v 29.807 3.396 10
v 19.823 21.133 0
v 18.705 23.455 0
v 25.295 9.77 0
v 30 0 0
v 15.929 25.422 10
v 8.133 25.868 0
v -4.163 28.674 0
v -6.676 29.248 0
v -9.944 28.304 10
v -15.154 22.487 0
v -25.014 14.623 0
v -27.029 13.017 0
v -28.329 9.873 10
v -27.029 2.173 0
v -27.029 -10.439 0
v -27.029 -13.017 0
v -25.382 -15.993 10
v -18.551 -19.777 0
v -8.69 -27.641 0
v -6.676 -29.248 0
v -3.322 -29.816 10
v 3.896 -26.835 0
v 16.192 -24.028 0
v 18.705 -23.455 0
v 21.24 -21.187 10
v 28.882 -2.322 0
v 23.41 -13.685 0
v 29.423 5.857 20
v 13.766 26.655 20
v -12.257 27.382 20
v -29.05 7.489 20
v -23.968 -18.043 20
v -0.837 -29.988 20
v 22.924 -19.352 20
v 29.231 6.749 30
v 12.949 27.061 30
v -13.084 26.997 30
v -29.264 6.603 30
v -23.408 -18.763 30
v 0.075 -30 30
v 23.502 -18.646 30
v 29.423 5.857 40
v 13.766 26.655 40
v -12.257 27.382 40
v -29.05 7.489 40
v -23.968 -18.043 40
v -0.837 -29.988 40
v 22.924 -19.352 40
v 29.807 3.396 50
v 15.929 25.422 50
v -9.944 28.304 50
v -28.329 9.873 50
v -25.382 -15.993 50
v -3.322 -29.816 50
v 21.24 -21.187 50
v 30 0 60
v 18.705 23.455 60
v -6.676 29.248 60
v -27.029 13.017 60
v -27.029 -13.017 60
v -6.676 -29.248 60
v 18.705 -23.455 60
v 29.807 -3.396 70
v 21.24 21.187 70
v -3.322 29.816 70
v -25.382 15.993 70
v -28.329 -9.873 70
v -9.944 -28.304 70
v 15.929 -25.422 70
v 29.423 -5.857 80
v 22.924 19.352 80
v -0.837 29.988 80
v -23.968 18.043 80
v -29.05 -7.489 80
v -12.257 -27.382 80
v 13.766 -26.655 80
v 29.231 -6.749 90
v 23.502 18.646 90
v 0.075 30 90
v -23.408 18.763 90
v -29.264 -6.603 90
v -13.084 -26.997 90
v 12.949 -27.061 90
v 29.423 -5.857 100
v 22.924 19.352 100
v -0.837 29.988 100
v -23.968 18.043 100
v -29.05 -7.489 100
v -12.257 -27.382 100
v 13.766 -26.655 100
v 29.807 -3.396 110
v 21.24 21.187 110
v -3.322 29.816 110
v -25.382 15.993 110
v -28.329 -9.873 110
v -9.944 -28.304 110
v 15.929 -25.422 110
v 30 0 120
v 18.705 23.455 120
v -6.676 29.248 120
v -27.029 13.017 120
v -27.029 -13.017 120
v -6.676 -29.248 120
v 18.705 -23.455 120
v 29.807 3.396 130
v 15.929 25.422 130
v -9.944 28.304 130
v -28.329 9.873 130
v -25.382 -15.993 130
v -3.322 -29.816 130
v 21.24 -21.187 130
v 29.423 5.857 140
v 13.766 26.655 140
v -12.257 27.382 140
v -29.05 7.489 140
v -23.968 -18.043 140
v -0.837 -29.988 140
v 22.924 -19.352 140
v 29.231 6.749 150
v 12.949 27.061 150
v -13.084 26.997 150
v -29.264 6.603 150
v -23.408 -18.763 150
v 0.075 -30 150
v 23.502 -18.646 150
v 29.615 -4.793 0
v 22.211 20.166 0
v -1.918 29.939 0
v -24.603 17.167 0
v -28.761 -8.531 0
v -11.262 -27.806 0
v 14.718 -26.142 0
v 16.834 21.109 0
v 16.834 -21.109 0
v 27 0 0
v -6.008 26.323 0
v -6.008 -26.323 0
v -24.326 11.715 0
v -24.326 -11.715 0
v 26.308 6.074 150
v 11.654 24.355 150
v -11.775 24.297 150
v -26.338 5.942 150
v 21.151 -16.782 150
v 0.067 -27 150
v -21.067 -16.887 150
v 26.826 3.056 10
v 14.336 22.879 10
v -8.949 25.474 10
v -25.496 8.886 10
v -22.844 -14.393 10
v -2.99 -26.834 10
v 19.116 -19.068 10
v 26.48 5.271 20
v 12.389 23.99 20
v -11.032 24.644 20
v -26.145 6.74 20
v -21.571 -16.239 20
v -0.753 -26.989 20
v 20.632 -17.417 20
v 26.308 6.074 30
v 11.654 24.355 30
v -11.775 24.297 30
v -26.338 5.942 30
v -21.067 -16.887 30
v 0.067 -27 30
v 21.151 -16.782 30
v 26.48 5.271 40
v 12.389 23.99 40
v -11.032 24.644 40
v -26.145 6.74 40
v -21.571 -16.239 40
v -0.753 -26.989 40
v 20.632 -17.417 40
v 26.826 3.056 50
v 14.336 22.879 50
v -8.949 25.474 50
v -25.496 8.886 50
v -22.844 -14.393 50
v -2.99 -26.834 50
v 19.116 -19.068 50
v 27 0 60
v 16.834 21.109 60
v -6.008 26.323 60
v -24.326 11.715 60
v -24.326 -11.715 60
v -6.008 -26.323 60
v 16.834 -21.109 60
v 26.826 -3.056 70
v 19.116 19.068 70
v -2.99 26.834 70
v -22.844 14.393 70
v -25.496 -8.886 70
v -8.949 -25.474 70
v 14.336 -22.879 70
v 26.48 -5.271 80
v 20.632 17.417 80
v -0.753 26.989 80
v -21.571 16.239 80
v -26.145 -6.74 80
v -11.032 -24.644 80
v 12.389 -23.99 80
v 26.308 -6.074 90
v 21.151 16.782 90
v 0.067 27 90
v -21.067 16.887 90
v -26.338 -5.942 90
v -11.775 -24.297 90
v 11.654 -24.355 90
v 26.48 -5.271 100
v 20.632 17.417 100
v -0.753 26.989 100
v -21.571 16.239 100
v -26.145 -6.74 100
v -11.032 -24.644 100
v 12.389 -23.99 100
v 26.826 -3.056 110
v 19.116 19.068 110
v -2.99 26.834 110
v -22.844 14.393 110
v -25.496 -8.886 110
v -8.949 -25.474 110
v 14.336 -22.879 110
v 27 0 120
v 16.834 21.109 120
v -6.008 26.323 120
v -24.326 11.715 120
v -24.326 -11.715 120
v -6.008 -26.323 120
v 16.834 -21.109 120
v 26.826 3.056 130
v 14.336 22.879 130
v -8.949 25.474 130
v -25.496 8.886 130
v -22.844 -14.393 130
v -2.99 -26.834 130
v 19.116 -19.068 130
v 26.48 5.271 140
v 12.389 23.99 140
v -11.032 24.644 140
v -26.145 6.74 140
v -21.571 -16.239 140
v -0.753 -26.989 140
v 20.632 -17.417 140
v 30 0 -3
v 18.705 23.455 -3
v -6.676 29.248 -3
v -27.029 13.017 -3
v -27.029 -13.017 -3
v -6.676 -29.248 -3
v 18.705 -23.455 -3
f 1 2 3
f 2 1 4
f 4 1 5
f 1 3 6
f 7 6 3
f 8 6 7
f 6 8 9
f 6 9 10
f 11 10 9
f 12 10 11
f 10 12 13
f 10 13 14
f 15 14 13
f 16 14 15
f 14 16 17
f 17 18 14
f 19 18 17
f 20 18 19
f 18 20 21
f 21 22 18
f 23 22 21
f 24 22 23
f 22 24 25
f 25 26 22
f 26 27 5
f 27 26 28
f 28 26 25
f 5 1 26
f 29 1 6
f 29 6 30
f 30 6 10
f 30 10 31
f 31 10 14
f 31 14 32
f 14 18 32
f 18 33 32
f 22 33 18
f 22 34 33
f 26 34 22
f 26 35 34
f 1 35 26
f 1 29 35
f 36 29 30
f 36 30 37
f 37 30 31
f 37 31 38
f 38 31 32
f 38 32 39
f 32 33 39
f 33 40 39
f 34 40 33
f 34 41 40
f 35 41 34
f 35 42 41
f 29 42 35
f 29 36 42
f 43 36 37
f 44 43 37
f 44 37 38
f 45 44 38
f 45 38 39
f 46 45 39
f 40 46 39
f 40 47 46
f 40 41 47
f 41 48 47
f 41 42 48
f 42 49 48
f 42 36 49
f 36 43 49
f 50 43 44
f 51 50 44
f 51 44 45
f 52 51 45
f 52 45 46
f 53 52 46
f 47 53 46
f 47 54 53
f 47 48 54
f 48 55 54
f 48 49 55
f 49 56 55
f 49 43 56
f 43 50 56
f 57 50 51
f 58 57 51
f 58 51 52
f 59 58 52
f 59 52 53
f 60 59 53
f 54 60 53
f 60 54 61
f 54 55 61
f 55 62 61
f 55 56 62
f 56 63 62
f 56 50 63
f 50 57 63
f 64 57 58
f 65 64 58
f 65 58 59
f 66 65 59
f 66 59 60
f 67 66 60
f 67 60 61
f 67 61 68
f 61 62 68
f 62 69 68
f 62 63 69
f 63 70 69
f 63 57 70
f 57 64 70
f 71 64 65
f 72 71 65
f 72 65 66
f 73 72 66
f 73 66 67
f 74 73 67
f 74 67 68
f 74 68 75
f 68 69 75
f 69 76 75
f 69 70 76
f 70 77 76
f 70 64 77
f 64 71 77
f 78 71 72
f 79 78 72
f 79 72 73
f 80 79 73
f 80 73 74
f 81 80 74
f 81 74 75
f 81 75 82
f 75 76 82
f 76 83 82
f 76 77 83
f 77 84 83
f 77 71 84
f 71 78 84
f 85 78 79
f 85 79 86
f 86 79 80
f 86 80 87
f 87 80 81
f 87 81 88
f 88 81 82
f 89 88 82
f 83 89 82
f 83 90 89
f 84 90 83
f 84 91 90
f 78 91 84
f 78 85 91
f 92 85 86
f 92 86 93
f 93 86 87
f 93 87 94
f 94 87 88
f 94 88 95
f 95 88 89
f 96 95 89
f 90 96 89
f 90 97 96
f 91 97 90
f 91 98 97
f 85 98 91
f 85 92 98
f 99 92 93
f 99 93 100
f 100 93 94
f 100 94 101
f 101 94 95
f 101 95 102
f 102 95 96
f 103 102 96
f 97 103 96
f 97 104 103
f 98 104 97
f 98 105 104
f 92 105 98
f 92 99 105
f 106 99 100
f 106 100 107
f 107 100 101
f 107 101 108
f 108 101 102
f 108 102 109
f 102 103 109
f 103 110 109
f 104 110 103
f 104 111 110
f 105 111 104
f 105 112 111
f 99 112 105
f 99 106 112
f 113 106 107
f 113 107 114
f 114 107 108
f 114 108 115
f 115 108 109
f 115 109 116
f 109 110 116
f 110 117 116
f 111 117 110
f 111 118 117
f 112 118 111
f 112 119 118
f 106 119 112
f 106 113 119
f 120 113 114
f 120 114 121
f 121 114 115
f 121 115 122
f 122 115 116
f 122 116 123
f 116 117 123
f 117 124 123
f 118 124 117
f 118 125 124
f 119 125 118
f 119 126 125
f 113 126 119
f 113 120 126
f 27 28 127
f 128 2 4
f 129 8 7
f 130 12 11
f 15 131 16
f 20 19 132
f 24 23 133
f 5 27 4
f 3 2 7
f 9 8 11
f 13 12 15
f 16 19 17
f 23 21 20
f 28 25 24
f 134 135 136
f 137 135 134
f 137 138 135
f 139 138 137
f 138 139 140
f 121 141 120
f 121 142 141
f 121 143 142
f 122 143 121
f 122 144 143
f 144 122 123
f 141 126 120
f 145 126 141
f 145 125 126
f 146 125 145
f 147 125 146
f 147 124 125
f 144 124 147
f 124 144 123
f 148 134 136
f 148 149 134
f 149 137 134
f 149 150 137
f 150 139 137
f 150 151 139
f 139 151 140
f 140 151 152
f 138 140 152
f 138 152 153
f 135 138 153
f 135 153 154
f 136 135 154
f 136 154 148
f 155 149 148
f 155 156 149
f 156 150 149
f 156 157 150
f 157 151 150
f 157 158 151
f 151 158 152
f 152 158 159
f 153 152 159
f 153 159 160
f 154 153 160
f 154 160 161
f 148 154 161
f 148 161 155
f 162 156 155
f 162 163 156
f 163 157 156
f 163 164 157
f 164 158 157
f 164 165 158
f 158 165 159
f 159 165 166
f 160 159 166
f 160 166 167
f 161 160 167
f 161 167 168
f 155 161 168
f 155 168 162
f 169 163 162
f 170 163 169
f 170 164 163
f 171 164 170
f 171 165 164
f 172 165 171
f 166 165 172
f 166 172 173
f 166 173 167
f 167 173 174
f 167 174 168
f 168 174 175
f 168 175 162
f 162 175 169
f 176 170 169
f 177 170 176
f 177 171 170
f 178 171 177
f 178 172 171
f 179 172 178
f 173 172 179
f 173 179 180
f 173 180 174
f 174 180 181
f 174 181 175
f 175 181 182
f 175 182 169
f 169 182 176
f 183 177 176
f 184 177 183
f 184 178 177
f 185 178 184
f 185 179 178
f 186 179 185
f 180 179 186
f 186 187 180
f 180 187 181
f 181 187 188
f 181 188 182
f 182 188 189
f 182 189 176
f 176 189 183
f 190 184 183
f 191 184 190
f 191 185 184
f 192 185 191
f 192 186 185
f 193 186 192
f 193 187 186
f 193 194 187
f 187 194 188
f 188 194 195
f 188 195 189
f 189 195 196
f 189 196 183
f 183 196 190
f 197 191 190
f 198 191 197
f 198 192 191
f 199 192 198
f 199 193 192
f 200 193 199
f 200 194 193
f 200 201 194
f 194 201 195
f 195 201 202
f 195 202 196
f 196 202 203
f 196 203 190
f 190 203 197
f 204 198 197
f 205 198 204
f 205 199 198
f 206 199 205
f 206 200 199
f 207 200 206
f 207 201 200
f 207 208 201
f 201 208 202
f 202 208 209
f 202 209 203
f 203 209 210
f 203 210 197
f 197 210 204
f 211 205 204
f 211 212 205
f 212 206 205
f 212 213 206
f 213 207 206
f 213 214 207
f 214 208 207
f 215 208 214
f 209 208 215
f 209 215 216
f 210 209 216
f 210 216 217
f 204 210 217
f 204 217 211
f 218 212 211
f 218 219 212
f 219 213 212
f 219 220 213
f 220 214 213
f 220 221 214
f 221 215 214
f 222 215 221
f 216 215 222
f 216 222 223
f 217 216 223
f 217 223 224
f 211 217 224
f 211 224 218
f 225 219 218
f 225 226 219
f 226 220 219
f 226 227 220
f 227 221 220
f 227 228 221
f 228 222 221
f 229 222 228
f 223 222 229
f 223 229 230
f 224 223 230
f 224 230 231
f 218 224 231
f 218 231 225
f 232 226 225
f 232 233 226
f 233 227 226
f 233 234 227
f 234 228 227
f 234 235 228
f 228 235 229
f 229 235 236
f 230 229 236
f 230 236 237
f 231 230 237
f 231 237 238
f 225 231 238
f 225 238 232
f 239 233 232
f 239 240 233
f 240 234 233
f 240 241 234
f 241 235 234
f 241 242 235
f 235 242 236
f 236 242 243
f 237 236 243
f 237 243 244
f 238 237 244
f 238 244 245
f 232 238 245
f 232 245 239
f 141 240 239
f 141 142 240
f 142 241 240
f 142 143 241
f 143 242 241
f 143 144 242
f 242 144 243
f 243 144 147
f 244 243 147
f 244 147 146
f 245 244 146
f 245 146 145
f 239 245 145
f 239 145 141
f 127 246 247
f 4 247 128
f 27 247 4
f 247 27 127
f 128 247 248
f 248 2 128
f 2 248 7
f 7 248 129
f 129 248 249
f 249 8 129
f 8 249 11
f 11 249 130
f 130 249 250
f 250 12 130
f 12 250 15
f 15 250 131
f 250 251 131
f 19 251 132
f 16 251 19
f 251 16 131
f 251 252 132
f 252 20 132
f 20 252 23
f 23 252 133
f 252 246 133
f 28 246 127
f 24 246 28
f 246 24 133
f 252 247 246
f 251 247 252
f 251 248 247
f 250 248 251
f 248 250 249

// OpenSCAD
//number of sides
sides = 7;
//spacing of Z levels
z_spacing = 10;
//maximum radius, center to outer vertex
m_radius = 30;
//thickness (at thickest part)
thickness = 3;
// number of levels 
nlevel = 15;
//phase angle change, determines twistiness
phasediff = 10;
//base thickness, if 0 there is no base.
bthick = 3;
module makepolyhelix(level,side,spacing,radius,phase){// level = # of levels, side = number of sides of polygon, spacing = length between levels, radius = distance from center to vertex of polygon, phase = number of degrees the polygon is rotated on every level 
    points = [for (i = [0:level]) for (j = [0:(side -1)]) [radius*cos(13*sin(i*spacing*75) + j*(360/side)),radius*sin(13*sin(i*spacing*75) + j*(360/side)),i*spacing] ];
    //generate two triangular faces for each generation of nested for loop, not sure how to make this more readable
    faces = [for (i = [0:(level-1)]) for (j = [0:(side -1)]) each 
        [ [j+(i*side), j+side*(i+1), (j+1)%side+i*side],
        [(j+1)%side+(i*side), j+side*(i+1), ((j+1)%side)+(i+1)*side]]];
    
    bottomface = [for (i = [0:side-1]) i];
    topface = [for (i = [1:side]) side*(level+1)-i];
    
    faces2 = concat(faces,[bottomface],[topface]);
    
    polyhedron(points,faces2);
}
            
difference(){
    makepolyhelix(nlevel,sides,z_spacing,m_radius,phasediff);
    makepolyhelix(nlevel,sides,z_spacing,m_radius-thickness,phasediff);
}
if (bthick > 0){
translate([0,0,-bthick]){makepolyhelix(1,sides,bthick,m_radius,0);}
}
